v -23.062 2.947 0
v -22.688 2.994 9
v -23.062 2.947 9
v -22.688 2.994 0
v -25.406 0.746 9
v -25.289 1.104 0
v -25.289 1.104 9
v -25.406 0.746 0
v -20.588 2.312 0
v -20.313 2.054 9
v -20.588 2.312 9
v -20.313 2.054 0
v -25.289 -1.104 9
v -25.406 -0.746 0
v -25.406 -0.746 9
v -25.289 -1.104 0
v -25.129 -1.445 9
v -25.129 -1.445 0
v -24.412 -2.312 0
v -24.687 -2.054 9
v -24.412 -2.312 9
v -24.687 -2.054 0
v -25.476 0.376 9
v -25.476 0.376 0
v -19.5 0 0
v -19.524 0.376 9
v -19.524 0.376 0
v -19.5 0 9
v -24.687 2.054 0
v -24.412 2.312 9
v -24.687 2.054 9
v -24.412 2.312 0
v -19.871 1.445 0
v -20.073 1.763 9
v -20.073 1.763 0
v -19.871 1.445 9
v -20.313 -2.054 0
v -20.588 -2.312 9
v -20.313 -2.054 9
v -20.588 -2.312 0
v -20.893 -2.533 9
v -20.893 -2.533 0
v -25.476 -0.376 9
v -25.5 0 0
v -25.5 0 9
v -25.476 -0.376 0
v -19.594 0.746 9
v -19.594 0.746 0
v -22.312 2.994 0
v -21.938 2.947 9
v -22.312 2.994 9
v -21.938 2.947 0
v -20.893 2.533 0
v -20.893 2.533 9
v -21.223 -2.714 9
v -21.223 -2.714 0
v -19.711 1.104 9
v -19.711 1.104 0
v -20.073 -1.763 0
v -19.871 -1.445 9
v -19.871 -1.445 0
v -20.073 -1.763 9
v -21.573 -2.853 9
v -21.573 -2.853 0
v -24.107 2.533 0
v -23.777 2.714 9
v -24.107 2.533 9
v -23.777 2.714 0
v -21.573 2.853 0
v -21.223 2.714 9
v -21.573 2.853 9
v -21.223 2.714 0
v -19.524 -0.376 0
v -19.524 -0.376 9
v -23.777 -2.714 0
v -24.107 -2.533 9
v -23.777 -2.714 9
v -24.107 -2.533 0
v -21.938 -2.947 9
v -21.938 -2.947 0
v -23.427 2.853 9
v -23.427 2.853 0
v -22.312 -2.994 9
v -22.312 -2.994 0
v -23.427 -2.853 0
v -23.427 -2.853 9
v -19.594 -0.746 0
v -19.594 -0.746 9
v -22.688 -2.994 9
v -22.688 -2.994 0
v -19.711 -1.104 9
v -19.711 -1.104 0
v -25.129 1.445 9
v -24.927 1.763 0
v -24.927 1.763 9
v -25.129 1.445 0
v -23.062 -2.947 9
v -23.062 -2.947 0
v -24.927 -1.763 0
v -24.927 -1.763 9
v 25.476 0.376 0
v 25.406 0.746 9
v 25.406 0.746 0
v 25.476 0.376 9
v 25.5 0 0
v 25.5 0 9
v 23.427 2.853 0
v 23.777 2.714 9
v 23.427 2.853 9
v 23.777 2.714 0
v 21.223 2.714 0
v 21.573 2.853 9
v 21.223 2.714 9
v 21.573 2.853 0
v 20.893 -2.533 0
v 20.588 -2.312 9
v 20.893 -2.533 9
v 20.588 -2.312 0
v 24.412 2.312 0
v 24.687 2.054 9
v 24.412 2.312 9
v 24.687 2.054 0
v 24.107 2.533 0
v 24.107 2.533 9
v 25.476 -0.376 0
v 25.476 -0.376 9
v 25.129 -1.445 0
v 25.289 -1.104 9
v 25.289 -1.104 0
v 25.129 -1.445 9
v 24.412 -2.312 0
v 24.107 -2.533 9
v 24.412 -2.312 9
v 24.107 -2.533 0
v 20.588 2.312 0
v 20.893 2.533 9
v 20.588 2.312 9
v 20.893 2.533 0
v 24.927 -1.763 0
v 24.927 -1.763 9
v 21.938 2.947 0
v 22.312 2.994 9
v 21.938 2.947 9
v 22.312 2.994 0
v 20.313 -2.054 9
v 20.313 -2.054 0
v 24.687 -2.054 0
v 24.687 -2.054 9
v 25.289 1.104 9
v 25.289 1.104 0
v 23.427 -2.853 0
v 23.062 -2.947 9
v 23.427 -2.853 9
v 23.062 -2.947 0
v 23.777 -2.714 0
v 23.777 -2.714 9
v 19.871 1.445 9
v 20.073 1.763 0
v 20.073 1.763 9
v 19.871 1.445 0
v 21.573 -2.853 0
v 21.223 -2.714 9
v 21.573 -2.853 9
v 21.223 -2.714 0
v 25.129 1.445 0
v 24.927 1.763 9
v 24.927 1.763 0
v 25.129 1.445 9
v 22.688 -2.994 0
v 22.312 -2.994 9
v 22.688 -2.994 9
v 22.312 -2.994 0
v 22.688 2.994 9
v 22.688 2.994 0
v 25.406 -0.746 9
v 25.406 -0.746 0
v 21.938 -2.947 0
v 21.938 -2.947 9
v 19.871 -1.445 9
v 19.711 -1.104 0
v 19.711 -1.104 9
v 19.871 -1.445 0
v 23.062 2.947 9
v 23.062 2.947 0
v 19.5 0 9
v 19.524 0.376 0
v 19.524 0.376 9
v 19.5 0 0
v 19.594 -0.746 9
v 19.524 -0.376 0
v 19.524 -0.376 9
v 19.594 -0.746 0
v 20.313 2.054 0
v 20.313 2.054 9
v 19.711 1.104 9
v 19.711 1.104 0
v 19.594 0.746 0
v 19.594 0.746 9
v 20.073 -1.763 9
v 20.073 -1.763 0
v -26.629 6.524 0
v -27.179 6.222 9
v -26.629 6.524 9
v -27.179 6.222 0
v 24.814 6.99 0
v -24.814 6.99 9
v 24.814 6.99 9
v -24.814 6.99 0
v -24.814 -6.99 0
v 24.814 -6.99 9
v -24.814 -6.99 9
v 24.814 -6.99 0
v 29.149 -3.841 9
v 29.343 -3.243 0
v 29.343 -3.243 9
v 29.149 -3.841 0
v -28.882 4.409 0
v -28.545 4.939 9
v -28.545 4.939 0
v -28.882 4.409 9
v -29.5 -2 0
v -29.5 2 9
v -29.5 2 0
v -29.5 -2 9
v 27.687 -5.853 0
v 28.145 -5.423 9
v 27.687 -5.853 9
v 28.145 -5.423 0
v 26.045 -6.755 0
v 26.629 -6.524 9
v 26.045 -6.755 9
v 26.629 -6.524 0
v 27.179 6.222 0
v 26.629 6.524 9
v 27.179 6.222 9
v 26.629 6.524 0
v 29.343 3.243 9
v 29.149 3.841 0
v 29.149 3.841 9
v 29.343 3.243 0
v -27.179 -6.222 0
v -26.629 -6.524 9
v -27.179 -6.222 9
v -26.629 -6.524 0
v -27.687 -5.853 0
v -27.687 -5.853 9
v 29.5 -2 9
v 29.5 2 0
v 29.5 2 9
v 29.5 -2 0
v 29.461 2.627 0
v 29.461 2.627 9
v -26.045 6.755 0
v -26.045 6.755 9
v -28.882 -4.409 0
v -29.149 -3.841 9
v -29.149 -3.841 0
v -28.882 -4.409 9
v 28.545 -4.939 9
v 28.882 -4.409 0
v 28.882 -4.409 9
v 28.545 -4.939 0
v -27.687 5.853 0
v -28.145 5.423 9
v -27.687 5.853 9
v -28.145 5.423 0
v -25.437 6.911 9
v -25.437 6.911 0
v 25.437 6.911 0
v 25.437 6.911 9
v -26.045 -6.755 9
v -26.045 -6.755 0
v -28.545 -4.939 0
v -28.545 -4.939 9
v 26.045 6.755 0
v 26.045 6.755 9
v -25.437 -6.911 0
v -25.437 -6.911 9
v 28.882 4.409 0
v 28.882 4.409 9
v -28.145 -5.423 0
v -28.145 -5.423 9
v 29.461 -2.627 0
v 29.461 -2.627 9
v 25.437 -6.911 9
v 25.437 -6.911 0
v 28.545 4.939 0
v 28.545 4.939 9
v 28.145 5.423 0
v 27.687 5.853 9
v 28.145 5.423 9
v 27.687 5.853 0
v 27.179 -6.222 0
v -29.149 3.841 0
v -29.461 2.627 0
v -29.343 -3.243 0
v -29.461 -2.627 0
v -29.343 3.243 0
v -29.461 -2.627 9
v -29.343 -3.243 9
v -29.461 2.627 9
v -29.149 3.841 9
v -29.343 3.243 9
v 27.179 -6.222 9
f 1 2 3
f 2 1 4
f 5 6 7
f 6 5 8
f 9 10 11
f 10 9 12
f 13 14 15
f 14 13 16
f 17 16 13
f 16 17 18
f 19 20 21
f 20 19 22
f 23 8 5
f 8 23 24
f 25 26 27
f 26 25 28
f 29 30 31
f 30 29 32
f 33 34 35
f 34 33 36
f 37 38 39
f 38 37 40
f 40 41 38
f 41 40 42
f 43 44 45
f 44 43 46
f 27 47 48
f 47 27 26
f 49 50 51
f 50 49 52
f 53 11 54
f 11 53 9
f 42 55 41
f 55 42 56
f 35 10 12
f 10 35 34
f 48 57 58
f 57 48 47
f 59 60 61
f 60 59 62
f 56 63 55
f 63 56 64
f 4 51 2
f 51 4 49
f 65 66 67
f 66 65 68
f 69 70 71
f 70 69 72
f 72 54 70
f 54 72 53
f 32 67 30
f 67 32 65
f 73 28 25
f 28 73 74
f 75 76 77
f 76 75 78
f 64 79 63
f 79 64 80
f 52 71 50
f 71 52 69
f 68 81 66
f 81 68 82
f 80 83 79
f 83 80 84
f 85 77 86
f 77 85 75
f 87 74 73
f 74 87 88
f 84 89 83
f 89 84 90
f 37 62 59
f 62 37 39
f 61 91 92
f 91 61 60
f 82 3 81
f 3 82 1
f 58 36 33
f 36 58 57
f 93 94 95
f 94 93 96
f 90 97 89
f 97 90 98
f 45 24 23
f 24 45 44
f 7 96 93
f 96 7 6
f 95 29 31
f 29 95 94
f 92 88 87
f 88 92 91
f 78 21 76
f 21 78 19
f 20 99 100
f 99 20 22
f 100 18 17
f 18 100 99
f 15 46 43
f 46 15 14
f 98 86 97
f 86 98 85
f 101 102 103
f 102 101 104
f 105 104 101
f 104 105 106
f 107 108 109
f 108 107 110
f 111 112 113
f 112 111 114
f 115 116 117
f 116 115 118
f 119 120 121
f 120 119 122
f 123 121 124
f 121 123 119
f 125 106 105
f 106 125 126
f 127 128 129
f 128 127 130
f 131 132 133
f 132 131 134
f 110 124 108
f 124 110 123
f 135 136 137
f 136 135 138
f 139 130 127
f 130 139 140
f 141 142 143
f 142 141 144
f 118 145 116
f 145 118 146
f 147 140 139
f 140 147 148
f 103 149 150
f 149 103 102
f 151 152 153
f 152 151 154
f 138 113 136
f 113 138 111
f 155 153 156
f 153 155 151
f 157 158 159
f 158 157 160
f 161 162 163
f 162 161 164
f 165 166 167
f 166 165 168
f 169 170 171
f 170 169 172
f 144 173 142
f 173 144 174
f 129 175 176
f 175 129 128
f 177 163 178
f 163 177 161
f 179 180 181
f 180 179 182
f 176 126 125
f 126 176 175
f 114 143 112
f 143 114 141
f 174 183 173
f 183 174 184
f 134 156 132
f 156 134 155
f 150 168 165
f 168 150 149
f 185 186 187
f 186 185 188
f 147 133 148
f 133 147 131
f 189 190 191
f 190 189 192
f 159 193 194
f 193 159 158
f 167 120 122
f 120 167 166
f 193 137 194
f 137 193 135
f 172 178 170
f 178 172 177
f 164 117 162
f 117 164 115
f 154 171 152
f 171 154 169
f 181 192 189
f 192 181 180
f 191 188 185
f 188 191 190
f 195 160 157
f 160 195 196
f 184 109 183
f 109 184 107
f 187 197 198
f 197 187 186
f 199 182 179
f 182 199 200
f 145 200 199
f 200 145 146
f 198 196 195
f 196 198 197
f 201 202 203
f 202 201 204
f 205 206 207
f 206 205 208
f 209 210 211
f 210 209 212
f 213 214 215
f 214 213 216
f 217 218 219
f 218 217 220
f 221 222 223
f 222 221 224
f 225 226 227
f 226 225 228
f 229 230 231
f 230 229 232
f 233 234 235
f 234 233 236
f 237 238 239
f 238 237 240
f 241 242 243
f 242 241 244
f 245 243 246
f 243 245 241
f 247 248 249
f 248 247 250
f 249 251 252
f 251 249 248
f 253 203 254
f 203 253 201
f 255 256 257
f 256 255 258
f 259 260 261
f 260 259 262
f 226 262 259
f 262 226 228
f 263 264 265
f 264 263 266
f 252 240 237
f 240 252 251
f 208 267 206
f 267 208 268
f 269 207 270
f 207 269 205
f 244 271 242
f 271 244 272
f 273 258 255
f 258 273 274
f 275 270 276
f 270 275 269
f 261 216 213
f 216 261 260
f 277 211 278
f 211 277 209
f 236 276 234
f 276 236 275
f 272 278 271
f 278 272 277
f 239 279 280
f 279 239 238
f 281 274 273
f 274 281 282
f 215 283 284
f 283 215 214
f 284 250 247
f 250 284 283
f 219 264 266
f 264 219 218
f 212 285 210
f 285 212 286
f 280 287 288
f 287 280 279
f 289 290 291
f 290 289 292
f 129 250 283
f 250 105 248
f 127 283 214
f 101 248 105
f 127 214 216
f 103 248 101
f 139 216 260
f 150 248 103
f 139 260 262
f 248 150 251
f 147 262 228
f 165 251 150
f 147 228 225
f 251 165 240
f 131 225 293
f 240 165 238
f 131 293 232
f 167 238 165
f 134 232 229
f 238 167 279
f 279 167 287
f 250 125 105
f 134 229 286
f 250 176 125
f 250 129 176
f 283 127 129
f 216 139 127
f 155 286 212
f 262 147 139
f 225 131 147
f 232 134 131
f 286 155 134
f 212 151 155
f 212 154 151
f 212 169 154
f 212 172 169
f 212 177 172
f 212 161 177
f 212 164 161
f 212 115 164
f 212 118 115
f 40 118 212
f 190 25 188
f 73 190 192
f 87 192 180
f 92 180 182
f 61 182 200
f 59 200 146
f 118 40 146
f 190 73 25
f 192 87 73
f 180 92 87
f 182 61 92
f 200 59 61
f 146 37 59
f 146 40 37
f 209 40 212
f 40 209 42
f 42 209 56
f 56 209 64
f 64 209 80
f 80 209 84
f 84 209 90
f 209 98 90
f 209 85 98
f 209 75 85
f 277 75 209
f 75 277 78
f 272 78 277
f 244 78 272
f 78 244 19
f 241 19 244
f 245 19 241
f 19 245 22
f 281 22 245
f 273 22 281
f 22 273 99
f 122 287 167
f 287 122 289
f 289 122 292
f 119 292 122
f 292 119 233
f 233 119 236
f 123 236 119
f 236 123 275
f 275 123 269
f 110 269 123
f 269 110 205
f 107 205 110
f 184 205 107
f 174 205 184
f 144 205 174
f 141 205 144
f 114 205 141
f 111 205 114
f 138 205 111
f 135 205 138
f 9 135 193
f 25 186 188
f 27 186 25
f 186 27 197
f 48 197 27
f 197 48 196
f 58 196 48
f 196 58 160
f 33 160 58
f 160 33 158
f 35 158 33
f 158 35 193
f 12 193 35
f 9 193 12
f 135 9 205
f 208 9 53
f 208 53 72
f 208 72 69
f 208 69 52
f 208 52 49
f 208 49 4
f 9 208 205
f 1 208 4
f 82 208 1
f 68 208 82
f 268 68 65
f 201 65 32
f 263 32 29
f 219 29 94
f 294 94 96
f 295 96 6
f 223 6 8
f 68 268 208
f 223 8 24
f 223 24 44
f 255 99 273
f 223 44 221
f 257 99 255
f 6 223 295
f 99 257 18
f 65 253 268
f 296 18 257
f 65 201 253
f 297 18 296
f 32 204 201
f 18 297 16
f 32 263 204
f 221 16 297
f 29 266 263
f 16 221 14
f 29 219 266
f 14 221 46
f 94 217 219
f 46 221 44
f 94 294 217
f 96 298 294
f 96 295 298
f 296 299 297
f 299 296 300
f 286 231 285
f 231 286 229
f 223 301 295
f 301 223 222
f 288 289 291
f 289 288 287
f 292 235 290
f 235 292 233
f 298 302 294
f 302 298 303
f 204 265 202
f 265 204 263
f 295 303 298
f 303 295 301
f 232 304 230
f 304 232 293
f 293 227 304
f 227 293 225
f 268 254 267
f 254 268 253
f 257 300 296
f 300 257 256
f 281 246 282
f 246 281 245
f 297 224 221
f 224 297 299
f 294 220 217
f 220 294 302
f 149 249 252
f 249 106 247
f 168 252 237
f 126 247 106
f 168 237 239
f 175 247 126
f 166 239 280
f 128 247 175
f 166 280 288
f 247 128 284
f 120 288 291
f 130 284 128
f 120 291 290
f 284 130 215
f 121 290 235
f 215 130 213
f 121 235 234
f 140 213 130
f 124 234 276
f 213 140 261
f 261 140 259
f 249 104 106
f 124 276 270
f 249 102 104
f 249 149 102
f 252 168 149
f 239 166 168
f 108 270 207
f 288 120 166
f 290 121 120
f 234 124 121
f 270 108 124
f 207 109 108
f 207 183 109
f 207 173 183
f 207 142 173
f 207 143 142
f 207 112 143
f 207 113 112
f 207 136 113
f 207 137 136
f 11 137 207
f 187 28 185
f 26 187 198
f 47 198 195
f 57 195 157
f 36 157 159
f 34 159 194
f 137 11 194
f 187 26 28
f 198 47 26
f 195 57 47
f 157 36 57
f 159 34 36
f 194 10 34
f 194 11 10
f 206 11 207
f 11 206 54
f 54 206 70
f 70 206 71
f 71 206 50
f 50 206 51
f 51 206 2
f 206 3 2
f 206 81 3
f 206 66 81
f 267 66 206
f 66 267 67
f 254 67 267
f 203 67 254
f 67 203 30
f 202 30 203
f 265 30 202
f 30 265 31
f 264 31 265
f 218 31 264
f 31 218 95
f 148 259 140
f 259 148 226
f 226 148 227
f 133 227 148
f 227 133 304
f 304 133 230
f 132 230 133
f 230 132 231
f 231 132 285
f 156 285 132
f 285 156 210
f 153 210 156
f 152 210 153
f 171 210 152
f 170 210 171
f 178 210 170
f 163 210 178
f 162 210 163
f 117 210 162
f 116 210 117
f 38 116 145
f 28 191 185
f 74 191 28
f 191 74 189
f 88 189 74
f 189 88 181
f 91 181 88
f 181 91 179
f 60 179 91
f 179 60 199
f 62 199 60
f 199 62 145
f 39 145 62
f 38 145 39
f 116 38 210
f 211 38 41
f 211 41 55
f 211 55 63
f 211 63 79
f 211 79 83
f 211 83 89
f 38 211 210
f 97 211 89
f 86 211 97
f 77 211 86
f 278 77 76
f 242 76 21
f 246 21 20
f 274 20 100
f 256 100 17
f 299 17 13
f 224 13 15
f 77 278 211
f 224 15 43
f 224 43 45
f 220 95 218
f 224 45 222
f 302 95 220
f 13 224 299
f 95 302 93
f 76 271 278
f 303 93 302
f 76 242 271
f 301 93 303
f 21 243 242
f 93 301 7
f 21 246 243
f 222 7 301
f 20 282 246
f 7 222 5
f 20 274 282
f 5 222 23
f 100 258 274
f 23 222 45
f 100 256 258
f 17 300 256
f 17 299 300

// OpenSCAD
$fn = 50;


difference() {
	union() {
		hull() {
			translate(v = [-24.5000000000, 2.0000000000, 0]) {
				cylinder(h = 9, r = 5);
			}
			translate(v = [24.5000000000, 2.0000000000, 0]) {
				cylinder(h = 9, r = 5);
			}
			translate(v = [-24.5000000000, -2.0000000000, 0]) {
				cylinder(h = 9, r = 5);
			}
			translate(v = [24.5000000000, -2.0000000000, 0]) {
				cylinder(h = 9, r = 5);
			}
		}
	}
	union() {
		translate(v = [-22.5000000000, 0.0000000000, -100.0000000000]) {
			cylinder(h = 200, r = 3.0000000000);
		}
		translate(v = [-22.5000000000, 0.0000000000, -100.0000000000]) {
			cylinder(h = 200, r = 3.0000000000);
		}
		translate(v = [22.5000000000, 0.0000000000, -100.0000000000]) {
			cylinder(h = 200, r = 3.0000000000);
		}
		translate(v = [22.5000000000, 0.0000000000, -100.0000000000]) {
			cylinder(h = 200, r = 3.0000000000);
		}
	}
}
